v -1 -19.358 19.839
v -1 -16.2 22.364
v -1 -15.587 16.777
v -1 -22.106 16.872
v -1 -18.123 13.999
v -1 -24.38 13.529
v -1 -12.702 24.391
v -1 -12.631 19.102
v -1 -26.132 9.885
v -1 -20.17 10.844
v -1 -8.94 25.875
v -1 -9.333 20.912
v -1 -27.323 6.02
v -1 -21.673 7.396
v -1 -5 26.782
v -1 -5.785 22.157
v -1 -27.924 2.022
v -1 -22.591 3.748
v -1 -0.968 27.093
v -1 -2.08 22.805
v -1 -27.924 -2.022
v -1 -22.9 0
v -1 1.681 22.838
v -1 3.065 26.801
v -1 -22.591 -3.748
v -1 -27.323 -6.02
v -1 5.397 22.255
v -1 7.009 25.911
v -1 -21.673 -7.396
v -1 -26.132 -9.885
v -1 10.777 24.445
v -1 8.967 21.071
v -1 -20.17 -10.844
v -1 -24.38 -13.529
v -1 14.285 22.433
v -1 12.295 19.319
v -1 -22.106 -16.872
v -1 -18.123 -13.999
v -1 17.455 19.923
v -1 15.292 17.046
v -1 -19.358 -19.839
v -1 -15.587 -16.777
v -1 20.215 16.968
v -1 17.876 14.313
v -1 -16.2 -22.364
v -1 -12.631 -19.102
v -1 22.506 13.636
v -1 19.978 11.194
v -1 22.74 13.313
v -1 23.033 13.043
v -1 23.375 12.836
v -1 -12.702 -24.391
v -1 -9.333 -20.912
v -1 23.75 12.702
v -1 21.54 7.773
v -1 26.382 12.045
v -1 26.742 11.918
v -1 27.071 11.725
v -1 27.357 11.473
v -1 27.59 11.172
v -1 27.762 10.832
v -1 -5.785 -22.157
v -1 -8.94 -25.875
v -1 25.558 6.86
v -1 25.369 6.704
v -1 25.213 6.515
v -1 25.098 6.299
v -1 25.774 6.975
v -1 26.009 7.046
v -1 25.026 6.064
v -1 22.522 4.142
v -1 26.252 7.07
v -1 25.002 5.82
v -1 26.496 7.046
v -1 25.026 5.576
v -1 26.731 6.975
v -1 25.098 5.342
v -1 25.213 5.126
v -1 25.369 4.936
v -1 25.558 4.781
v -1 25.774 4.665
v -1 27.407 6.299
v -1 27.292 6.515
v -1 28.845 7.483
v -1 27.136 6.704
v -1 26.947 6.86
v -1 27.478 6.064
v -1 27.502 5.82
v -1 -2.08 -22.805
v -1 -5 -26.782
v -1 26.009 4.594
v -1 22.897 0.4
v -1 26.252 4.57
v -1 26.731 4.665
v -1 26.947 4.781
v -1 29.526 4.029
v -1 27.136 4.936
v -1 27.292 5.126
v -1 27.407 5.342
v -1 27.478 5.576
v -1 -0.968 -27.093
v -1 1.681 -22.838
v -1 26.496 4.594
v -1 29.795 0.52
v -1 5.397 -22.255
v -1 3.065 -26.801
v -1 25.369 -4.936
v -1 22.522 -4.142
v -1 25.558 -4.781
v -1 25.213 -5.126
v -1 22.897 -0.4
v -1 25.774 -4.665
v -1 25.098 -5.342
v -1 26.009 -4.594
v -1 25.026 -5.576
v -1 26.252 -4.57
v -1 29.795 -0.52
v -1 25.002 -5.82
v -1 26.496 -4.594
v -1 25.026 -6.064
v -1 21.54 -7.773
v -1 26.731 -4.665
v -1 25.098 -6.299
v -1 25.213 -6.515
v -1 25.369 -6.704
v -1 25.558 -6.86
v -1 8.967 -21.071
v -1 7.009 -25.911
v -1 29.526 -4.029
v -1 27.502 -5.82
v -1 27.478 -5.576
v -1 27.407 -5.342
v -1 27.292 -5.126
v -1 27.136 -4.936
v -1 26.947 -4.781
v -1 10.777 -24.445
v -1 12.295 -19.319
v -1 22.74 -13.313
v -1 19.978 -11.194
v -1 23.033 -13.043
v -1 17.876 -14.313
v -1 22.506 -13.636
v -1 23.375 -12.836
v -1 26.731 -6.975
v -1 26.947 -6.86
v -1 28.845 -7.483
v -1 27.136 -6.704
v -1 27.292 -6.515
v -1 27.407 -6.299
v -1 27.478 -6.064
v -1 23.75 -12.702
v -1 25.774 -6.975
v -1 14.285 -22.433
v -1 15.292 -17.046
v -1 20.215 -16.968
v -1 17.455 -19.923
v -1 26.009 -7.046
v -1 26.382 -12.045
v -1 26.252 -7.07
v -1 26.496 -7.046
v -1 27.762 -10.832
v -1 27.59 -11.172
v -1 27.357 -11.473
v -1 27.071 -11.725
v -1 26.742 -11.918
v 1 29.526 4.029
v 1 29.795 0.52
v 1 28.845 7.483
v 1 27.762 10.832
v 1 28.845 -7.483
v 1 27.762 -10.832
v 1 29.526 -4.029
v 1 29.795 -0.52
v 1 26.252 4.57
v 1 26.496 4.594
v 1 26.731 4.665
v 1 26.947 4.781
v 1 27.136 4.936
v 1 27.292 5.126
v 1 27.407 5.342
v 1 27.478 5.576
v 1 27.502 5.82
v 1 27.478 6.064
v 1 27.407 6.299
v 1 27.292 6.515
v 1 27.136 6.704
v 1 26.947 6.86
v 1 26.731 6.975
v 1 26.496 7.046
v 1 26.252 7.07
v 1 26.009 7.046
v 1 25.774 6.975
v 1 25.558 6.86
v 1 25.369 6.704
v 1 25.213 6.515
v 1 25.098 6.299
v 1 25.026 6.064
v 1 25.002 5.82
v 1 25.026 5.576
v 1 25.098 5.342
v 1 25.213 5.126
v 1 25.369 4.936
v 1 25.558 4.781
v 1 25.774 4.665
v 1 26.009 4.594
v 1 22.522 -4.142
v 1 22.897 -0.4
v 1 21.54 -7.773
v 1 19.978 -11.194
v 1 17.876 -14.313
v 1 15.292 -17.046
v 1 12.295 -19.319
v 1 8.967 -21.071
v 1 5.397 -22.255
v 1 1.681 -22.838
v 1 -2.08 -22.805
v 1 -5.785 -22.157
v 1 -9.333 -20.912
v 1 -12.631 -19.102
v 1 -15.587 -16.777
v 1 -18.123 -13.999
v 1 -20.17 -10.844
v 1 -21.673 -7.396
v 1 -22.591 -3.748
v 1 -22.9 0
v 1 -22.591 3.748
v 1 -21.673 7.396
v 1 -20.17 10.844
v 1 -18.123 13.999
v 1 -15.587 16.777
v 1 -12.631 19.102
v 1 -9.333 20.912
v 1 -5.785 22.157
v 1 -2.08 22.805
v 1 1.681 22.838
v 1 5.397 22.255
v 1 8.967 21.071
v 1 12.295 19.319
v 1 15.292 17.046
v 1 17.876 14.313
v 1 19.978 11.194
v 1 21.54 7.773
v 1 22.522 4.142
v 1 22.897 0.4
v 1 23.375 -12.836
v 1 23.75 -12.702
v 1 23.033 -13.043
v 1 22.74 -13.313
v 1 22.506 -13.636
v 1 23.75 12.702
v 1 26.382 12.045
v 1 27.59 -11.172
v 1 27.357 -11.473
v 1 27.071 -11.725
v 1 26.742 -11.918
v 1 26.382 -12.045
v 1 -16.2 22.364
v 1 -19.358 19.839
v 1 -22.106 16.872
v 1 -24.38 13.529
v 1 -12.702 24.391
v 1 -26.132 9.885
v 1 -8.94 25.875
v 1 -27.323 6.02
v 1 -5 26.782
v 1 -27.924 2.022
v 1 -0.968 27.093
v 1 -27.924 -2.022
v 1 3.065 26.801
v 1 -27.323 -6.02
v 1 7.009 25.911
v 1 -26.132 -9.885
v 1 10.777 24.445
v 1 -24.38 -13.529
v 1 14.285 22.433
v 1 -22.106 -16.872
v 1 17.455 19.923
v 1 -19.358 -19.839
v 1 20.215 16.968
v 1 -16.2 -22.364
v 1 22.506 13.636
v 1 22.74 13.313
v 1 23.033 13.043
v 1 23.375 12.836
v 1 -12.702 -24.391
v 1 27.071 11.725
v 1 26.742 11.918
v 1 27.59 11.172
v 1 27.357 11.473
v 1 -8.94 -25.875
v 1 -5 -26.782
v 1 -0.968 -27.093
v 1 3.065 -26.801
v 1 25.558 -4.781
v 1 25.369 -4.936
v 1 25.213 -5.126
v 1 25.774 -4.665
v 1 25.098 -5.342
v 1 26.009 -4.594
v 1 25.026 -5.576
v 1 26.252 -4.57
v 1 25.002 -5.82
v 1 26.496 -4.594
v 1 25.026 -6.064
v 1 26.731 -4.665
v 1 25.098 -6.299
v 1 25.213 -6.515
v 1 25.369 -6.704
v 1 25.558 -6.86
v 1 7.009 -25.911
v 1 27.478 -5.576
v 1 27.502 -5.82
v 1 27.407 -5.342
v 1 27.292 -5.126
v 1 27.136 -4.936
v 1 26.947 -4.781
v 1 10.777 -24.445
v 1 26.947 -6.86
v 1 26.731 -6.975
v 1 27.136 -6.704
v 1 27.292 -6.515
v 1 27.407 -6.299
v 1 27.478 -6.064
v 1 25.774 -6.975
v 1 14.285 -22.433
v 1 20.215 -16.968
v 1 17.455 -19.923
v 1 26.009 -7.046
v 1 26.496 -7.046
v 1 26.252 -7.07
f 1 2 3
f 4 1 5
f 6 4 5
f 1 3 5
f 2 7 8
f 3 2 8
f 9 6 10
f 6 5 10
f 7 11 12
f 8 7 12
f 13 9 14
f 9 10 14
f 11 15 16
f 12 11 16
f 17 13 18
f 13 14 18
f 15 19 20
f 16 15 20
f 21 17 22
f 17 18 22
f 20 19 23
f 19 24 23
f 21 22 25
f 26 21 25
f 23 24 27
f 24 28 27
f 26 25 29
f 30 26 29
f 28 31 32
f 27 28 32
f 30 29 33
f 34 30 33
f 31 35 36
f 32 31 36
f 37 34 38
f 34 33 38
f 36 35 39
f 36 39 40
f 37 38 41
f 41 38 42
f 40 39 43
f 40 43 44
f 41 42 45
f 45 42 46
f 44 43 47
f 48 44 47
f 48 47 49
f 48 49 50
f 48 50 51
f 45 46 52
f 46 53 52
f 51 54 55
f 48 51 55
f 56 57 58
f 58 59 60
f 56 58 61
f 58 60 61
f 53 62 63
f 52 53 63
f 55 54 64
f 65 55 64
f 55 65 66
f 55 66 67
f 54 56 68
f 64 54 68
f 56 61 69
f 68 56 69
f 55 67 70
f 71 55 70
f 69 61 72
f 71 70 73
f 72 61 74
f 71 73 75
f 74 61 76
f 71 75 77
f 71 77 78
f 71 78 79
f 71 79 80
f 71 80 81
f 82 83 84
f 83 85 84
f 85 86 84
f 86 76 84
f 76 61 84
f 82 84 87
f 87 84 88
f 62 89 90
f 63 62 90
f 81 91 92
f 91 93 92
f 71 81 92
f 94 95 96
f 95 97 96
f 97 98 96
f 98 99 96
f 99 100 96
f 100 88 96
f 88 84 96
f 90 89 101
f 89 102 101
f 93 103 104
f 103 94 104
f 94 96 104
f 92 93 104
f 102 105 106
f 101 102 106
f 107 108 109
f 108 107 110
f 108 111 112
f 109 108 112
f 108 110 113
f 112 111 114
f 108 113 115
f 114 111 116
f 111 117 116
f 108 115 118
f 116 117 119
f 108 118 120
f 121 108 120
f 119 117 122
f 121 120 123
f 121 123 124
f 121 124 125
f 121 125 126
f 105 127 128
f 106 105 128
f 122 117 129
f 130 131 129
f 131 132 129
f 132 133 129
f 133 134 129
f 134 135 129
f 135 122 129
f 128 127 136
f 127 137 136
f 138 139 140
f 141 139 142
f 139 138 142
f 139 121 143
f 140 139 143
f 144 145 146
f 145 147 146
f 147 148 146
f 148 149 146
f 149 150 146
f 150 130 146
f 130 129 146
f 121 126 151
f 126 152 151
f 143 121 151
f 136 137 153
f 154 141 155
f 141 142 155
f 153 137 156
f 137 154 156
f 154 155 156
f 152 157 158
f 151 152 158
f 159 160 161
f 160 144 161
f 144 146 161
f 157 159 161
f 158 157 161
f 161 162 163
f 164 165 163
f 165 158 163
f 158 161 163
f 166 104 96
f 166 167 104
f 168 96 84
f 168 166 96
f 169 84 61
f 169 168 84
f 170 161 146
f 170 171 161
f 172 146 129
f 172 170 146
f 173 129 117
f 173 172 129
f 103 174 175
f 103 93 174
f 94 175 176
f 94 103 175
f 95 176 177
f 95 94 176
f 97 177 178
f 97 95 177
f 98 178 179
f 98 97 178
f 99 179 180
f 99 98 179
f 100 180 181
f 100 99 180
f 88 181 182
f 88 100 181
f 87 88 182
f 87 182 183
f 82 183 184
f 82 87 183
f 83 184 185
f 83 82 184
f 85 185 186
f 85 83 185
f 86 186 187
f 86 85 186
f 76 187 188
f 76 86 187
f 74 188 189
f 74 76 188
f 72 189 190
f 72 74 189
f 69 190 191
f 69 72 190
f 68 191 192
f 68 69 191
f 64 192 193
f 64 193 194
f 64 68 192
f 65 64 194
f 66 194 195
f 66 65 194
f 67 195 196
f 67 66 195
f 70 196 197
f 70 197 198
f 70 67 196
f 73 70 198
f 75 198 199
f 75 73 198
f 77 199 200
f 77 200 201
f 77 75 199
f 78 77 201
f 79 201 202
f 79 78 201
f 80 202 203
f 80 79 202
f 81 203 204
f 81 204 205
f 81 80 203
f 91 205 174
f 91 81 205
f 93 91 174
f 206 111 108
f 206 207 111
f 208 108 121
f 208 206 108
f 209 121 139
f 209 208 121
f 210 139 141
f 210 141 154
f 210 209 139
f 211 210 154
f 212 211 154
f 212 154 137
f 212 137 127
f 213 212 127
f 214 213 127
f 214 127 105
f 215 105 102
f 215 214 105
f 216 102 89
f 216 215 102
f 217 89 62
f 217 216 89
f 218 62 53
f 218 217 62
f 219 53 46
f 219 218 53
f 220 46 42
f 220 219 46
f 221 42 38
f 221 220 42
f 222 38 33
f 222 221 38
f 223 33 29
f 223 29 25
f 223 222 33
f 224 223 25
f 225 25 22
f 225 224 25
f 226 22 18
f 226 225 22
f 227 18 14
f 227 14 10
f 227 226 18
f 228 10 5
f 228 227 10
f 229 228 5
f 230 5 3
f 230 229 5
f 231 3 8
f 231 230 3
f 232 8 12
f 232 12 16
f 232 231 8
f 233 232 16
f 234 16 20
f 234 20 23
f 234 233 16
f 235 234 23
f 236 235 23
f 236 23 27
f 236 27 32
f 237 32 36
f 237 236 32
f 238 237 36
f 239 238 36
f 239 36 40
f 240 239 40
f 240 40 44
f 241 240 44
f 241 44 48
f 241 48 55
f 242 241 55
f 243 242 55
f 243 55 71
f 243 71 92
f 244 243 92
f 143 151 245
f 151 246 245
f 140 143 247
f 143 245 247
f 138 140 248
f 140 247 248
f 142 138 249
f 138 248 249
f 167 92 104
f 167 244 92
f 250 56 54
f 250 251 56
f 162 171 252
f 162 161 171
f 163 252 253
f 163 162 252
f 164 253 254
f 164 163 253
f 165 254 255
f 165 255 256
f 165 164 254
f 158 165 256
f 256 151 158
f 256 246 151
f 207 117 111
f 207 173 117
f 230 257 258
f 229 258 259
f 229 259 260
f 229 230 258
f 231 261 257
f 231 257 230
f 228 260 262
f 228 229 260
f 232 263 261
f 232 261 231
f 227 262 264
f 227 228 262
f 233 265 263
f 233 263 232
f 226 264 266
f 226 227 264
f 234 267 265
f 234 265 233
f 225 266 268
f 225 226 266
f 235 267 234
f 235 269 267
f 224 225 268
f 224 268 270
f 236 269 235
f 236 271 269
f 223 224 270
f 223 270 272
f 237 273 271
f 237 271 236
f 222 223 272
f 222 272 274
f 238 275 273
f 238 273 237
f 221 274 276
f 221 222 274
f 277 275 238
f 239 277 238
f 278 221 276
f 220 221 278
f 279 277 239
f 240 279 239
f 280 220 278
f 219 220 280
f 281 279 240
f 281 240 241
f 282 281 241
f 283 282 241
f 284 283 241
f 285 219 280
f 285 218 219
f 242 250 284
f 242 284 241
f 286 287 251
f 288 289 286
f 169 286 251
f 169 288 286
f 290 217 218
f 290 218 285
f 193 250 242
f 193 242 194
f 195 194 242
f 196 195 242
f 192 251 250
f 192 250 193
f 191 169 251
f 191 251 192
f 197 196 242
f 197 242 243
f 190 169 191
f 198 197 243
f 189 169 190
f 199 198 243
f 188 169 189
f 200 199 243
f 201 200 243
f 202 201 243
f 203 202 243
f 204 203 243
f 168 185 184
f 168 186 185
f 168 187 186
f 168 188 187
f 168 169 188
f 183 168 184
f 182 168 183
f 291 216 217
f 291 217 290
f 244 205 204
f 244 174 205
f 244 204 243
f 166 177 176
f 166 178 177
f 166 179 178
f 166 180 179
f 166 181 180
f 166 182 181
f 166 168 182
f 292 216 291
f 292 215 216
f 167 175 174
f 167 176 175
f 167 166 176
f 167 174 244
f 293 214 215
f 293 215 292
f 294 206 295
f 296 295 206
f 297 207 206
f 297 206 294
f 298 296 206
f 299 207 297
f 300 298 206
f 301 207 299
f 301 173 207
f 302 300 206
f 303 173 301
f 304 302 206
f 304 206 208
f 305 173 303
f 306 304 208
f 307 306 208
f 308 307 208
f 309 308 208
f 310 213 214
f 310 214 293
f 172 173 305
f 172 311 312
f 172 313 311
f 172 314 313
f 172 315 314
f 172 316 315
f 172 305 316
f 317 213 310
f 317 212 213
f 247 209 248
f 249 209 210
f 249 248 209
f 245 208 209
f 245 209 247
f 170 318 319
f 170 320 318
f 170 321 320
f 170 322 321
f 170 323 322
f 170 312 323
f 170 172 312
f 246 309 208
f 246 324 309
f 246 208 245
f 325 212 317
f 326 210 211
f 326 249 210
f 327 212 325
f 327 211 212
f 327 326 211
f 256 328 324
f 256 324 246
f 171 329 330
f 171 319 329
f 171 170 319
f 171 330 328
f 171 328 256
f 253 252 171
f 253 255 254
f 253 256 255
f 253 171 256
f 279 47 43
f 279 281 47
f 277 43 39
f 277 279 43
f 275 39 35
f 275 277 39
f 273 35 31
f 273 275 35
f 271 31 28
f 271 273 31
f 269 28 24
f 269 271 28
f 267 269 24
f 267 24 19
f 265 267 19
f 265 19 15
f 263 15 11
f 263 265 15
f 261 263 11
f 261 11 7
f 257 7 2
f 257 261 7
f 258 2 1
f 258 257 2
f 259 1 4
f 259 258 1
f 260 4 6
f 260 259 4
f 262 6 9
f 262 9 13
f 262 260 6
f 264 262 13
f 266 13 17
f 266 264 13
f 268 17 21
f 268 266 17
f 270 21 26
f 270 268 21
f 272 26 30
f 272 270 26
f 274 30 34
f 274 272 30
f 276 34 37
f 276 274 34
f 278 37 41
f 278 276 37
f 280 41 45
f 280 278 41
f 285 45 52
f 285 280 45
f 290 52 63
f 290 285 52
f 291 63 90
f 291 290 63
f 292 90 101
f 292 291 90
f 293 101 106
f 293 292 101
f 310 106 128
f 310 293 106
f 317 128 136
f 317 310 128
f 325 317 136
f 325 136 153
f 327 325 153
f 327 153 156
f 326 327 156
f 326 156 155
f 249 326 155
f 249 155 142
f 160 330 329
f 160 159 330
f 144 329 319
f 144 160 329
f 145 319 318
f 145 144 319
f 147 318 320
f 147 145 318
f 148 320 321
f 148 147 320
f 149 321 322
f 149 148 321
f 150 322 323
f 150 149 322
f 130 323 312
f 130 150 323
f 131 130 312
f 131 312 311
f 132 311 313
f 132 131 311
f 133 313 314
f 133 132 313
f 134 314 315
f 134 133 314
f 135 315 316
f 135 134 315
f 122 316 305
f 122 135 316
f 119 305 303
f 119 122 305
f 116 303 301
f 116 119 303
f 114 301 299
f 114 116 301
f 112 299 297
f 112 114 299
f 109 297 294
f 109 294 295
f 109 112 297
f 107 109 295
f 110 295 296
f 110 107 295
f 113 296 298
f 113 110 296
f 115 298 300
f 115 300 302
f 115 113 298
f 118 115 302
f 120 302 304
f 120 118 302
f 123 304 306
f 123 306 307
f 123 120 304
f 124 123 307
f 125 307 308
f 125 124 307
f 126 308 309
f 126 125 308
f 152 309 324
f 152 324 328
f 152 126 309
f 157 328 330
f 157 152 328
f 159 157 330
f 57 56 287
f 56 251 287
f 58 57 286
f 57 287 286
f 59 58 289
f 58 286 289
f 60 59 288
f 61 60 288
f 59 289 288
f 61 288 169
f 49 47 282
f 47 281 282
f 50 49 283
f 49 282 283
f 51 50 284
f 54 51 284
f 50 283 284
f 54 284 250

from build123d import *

# Parameters (mm, degrees)
SKETCH1_R      = 1.25
EXTRUDE1_DEPTH = 1
FILLET1_R      = 2


with BuildPart() as part:
    # Sketch1 → Extrude1 (new, symmetric)
    with BuildSketch(Plane(origin=(0, 0, 0), x_dir=(0, 0, -1), z_dir=(1, 0, 0))):
        with BuildLine():
            Line((-0.399660107, 22.896512219), (-0.520081712, 29.795461316))
            ThreePointArc((-0.520081712, 29.795461316), (-6.279068206, 29.1309681), (-11.800426172, 27.364026425))
            Line((-11.800426172, 27.364026425), (-12.910119658, 22.913288948))
            ThreePointArc((-12.910119658, 22.913288948), (0, -28), (12.910119658, 22.913288948))
            Line((12.910119658, 22.913288948), (11.800426172, 27.364026425))
            ThreePointArc((11.800426172, 27.364026425), (6.279068206, 29.1309681), (0.520081712, 29.795461316))
            Line((0.520081712, 29.795461316), (0.399660107, 22.896512219))
            ThreePointArc((0.399660107, 22.896512219), (0, -22.9), (-0.399660107, 22.896512219))
        make_face()
        with Locations((-5.820259343, 26.252420839)):
            Circle(SKETCH1_R, mode=Mode.SUBTRACT)
        with Locations((5.820259343, 26.252420839)):
            Circle(SKETCH1_R, mode=Mode.SUBTRACT)
    extrude(amount=EXTRUDE1_DEPTH, both=True)

    # Fillet1
    fillet1_edges = [part.edges().sort_by_distance(p)[0] for p in [
        (0, 27.364026425, -11.800426172),
        (0, 22.913288948, -12.910119658),
        (0, 22.913288948, 12.910119658),
        (0, 27.364026425, 11.800426172),
    ]]
    fillet(fillet1_edges, radius=FILLET1_R)


solid = part.part
